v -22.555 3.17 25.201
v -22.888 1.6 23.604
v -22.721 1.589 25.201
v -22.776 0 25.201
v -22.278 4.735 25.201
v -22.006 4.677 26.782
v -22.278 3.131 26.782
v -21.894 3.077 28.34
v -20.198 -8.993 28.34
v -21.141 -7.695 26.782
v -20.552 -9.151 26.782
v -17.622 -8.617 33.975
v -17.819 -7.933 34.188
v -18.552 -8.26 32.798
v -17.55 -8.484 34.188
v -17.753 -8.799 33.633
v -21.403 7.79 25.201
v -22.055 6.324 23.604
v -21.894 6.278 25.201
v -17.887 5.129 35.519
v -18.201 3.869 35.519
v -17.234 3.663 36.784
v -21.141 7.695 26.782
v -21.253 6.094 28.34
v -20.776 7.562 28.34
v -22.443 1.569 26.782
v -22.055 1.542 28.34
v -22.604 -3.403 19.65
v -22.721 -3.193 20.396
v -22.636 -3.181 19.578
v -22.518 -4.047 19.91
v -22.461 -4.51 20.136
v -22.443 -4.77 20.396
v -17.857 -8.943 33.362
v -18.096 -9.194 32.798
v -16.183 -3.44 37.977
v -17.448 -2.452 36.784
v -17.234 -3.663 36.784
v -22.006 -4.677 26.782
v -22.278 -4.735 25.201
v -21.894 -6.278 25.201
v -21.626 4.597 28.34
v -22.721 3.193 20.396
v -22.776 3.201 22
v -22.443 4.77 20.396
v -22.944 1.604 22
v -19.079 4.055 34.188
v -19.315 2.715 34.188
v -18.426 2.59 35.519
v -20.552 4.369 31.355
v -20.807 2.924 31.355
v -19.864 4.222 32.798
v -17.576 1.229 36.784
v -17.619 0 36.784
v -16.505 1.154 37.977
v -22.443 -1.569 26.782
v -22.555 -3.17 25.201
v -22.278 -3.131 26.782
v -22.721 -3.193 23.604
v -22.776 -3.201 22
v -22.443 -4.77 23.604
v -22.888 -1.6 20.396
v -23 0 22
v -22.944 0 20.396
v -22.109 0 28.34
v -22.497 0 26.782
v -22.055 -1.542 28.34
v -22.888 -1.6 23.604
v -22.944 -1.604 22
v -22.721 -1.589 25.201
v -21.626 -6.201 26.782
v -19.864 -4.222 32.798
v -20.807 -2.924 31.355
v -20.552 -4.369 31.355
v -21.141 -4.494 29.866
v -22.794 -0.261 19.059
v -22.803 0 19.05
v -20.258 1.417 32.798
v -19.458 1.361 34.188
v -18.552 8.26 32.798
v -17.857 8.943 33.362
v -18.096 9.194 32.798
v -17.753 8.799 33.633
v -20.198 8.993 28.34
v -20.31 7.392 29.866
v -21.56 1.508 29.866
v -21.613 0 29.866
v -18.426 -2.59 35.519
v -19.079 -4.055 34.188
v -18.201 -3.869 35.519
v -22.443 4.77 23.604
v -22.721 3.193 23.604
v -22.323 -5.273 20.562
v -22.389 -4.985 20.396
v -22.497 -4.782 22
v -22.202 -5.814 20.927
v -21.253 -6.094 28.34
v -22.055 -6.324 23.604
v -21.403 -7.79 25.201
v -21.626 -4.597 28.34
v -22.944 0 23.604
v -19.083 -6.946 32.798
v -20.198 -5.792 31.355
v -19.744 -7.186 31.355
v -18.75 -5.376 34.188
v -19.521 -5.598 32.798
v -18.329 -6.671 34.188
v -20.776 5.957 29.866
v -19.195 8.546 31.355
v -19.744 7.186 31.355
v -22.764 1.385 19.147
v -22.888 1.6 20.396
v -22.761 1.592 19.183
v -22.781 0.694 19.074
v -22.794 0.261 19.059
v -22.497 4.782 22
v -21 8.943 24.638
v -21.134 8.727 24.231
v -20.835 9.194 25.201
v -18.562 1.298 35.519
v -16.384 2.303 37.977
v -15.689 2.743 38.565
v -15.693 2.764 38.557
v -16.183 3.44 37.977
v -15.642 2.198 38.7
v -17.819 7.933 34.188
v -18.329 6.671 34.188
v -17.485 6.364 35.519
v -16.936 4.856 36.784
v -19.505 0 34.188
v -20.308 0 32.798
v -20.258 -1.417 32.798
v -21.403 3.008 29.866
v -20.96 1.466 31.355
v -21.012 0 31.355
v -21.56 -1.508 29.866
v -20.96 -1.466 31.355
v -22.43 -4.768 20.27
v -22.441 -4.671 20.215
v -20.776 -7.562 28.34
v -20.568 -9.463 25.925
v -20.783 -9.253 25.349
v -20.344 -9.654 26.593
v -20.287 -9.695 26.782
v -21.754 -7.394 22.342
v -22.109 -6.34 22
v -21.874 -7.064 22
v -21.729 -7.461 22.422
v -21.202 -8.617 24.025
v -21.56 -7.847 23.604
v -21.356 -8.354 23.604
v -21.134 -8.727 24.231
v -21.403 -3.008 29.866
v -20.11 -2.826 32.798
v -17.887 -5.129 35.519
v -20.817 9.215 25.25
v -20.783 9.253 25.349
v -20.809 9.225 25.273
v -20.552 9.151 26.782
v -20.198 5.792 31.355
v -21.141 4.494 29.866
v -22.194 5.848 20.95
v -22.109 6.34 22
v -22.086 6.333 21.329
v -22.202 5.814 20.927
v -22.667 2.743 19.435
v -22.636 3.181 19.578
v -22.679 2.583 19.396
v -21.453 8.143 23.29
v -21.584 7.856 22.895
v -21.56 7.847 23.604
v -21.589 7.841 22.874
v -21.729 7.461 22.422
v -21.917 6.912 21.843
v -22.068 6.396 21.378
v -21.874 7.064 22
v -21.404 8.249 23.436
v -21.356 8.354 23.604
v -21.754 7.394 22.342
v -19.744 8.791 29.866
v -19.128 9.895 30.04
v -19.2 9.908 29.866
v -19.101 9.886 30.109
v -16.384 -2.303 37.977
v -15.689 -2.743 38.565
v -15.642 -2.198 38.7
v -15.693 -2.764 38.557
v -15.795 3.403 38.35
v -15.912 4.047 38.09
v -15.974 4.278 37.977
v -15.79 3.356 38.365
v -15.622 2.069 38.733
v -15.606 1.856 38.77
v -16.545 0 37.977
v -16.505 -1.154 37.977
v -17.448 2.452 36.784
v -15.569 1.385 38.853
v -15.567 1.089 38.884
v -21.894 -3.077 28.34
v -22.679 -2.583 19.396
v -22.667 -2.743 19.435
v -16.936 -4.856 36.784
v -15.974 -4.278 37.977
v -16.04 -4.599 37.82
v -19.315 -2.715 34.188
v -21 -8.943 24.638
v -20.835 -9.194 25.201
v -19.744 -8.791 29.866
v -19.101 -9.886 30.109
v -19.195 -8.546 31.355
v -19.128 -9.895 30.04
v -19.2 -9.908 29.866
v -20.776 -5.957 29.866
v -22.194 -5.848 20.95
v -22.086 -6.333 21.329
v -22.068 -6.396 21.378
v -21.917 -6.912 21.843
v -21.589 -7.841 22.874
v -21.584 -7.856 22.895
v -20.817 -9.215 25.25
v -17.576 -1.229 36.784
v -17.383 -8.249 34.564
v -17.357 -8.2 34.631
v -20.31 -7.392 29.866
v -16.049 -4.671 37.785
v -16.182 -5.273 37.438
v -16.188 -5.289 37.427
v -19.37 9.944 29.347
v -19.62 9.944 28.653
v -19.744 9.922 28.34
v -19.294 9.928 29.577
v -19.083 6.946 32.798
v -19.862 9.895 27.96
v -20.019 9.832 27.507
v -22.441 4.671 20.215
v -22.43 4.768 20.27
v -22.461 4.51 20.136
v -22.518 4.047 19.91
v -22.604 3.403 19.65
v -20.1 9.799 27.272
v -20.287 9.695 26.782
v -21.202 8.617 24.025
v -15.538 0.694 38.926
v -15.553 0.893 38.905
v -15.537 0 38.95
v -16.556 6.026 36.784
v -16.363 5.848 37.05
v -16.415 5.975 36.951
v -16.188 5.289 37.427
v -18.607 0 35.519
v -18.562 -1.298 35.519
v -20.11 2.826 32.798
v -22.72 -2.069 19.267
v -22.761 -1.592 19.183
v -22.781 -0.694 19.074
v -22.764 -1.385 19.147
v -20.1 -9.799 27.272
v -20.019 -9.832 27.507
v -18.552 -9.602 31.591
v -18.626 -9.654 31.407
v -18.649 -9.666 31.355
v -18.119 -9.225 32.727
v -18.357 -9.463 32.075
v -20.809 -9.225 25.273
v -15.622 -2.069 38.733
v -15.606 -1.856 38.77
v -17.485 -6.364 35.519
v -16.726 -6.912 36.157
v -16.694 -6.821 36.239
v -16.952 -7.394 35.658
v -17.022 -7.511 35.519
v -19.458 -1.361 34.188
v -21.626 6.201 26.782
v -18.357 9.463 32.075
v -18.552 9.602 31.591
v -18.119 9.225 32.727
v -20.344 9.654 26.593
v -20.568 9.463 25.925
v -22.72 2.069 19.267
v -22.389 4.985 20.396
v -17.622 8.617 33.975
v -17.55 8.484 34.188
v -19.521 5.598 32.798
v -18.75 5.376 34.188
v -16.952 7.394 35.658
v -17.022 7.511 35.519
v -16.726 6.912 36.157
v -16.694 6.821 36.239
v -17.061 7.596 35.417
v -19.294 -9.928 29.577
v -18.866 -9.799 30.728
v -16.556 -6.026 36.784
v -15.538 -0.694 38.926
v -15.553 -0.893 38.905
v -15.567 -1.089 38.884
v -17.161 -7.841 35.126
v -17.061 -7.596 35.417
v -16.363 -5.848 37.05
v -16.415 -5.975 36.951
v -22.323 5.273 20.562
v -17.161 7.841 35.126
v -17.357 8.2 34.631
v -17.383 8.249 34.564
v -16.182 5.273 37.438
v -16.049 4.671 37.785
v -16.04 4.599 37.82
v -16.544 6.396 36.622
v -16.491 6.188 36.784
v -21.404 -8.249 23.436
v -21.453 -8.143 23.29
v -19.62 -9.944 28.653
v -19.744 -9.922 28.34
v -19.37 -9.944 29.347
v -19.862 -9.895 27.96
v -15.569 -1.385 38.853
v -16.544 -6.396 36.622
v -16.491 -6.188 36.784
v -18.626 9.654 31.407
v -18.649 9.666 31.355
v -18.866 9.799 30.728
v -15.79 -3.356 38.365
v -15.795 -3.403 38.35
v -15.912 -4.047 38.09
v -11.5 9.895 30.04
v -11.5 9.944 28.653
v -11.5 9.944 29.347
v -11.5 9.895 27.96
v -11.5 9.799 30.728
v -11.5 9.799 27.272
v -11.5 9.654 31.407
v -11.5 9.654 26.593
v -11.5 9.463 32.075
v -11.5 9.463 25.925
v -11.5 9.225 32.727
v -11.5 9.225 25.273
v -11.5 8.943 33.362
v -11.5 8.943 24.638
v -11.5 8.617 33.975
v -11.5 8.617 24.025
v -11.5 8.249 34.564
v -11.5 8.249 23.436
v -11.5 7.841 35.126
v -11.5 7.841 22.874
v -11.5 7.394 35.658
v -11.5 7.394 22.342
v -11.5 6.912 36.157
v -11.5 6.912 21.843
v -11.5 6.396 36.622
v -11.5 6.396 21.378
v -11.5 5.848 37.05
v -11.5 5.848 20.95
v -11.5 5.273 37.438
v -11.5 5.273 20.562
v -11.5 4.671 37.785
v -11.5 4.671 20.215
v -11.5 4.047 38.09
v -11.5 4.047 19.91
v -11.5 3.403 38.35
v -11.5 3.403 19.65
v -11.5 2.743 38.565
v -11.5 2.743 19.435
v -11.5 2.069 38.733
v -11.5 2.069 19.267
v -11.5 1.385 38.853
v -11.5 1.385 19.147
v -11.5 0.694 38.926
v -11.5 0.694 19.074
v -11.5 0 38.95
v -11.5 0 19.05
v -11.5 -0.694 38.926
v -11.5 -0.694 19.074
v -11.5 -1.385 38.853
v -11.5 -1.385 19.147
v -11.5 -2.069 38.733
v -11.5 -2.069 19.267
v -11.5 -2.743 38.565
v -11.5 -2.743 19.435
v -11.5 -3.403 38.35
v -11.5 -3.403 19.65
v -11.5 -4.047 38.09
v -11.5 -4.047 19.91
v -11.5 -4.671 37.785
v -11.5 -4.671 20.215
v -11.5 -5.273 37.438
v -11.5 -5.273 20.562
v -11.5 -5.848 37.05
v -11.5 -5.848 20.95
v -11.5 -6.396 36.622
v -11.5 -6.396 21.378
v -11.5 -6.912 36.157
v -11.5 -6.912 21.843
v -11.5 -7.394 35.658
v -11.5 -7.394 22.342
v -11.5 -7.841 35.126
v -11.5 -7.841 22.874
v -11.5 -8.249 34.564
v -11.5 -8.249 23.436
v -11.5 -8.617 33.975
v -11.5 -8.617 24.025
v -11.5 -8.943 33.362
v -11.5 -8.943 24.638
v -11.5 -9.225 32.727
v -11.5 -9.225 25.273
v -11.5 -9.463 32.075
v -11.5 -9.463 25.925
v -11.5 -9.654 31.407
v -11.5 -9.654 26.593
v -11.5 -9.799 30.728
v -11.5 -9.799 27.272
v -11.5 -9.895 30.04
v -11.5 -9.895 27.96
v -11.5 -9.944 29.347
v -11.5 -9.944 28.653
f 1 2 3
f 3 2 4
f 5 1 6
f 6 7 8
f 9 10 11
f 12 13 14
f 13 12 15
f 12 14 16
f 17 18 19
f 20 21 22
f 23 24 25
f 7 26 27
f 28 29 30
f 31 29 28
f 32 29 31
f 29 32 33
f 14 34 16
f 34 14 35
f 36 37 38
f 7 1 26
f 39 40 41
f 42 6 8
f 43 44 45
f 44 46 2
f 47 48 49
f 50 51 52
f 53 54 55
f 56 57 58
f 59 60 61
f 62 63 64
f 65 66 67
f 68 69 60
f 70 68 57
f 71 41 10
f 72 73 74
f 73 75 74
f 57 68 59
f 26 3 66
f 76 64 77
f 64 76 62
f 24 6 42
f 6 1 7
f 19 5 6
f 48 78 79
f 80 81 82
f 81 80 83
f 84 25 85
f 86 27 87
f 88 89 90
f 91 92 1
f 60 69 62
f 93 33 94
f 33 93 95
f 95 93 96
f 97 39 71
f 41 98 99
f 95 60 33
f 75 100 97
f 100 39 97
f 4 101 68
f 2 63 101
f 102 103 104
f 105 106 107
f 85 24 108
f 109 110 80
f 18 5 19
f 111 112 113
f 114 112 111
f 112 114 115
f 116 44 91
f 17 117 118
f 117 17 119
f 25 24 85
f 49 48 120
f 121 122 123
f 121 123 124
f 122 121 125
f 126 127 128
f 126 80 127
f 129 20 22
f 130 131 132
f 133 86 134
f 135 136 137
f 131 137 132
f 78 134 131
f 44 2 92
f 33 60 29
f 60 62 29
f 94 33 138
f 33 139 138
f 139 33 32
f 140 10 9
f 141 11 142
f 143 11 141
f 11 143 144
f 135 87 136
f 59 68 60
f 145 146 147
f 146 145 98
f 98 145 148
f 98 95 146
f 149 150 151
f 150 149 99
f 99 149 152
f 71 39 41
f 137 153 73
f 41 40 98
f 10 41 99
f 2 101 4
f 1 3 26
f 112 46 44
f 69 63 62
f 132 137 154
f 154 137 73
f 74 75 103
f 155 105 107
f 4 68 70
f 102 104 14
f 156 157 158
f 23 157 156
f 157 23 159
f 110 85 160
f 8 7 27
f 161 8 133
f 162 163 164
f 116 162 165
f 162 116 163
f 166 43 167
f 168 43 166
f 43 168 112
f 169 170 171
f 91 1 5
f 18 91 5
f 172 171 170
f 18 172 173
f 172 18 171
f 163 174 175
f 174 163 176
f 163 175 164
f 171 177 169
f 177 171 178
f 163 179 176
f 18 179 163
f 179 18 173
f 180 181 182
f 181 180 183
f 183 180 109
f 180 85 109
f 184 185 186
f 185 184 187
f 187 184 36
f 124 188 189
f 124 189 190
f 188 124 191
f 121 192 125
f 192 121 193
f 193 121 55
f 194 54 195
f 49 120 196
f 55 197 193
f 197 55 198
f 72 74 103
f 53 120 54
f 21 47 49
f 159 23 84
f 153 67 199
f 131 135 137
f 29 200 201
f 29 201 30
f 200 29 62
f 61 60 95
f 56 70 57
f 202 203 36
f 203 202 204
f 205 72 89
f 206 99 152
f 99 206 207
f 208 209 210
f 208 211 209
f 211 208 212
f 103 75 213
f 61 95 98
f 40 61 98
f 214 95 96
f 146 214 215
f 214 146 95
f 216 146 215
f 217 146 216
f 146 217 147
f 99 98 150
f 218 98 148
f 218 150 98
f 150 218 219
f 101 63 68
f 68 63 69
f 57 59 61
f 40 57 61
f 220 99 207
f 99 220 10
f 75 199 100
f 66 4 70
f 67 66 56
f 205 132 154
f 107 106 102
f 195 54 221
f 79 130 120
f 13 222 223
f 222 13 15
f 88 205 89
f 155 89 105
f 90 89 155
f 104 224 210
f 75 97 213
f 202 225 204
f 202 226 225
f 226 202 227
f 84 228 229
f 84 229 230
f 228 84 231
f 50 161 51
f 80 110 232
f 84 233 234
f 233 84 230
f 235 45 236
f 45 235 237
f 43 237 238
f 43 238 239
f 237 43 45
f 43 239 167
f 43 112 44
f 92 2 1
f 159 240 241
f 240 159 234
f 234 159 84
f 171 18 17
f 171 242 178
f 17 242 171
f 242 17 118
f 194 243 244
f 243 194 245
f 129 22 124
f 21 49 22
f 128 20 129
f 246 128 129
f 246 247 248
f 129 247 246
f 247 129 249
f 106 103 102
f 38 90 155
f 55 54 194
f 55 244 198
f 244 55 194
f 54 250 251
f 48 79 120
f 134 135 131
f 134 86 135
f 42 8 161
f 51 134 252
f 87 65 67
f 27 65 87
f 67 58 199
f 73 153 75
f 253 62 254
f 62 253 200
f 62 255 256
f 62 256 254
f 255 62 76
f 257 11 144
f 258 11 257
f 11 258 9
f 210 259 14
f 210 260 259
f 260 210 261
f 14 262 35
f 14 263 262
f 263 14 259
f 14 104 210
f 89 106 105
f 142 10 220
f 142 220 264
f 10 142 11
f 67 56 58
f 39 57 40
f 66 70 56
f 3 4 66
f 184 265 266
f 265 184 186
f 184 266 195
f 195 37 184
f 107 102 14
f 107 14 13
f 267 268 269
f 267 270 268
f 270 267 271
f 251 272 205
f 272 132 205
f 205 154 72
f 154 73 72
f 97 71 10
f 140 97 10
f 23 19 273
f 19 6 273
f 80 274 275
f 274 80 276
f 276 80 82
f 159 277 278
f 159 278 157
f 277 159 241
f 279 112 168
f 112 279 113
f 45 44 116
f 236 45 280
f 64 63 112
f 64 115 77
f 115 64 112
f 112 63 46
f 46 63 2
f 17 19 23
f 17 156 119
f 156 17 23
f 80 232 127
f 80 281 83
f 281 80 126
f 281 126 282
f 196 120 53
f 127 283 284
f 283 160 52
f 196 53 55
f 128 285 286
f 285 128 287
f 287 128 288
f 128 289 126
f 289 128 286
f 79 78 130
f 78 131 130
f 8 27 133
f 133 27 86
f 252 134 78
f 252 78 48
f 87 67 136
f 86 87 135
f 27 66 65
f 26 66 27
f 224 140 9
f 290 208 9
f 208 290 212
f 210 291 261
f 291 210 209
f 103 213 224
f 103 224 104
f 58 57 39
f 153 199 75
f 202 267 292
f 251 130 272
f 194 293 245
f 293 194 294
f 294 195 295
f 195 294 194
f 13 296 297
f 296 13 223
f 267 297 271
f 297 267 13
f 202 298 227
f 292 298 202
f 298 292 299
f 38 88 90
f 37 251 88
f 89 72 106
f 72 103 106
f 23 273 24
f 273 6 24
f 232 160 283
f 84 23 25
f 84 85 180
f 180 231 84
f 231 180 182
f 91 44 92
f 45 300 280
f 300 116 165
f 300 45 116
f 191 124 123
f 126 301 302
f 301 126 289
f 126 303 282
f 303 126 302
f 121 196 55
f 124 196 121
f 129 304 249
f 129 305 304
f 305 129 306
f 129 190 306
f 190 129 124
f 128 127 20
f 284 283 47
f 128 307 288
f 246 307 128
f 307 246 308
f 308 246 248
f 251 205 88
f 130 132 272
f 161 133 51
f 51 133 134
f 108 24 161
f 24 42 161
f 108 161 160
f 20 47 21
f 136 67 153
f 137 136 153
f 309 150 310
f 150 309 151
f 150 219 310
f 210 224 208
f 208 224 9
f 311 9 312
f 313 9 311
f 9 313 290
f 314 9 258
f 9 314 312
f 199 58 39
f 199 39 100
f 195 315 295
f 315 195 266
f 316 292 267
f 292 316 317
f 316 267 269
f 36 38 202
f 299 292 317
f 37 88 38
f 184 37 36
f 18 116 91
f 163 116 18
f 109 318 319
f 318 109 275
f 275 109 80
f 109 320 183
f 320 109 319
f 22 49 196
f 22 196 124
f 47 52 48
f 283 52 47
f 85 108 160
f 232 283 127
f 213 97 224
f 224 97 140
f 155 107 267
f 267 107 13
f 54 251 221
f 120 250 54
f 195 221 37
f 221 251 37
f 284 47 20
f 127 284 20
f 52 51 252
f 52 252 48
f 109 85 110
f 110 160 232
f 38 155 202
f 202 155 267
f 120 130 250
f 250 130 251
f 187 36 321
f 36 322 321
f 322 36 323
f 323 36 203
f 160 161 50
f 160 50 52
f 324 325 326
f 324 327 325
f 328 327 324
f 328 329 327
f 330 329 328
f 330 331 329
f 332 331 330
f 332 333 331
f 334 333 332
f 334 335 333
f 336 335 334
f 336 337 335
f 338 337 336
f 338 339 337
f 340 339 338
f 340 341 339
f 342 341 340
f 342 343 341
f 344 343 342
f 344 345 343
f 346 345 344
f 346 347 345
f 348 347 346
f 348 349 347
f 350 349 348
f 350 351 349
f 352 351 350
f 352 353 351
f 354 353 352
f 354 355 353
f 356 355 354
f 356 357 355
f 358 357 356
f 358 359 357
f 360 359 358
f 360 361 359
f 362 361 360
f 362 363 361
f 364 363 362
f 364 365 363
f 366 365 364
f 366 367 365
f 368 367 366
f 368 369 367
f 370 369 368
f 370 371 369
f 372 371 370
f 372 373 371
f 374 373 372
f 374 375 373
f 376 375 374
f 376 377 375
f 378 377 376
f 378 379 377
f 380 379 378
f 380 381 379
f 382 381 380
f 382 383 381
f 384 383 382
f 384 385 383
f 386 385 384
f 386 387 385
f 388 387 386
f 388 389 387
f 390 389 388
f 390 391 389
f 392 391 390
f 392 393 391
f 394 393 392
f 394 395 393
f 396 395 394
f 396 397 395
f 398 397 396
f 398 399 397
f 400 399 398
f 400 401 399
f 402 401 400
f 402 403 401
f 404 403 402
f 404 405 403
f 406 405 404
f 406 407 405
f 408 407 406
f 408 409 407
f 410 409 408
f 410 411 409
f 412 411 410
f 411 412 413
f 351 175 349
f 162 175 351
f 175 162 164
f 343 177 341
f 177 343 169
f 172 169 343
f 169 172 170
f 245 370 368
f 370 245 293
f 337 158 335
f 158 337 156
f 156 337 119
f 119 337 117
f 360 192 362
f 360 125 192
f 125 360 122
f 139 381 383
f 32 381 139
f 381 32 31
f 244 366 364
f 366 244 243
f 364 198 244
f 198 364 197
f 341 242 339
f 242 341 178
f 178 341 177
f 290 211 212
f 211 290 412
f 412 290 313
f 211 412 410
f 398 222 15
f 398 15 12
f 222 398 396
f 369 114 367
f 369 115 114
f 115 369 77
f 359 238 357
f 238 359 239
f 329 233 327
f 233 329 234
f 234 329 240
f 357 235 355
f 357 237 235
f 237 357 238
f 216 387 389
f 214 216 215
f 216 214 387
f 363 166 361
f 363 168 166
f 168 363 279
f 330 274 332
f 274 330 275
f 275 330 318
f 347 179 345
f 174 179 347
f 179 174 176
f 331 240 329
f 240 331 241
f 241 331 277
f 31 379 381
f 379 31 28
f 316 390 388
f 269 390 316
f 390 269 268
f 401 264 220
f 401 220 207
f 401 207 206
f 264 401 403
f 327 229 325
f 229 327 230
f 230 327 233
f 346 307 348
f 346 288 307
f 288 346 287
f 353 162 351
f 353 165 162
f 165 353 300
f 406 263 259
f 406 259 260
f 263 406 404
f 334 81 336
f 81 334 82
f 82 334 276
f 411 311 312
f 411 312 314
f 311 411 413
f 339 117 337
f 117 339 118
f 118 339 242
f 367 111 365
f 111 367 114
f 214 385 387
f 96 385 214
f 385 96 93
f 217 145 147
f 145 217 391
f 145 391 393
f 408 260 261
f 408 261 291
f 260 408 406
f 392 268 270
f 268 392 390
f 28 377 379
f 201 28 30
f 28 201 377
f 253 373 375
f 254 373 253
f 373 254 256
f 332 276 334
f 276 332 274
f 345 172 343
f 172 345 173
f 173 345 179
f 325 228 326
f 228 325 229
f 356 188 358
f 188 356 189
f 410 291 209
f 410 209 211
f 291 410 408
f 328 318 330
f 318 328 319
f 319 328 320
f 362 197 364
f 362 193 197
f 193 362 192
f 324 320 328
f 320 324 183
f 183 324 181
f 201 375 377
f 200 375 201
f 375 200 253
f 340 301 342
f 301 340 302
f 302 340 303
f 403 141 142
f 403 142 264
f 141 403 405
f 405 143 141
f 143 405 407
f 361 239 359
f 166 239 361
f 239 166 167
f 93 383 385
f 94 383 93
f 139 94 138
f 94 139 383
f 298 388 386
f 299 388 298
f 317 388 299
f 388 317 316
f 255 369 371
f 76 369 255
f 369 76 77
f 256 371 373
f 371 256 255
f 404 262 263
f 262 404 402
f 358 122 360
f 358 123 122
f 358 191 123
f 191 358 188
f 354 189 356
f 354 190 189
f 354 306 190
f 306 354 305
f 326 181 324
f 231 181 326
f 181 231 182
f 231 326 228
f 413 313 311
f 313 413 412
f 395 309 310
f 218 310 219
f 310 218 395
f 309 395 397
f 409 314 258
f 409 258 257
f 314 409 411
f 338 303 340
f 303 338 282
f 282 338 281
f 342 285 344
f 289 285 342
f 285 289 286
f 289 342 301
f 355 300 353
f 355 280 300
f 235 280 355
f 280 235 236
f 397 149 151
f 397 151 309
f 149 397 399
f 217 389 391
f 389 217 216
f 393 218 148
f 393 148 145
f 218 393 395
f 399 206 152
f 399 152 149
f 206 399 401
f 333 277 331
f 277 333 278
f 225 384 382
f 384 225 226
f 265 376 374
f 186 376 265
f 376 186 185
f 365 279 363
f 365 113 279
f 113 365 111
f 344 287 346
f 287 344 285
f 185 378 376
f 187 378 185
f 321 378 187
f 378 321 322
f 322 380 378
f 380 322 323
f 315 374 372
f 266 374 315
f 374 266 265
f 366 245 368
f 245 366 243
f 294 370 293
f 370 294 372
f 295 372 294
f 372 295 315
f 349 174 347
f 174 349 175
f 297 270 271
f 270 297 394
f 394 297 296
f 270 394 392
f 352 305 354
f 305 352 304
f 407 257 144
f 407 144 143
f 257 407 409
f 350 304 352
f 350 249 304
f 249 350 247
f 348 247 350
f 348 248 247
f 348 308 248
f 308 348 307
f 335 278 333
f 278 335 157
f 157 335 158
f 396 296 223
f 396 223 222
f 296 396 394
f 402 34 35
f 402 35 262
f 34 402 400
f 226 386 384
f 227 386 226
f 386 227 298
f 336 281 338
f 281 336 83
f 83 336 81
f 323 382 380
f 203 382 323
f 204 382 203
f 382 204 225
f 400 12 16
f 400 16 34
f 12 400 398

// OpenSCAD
$fn=90;
intersection()
{
  difference()
  {
    translate([0,0,22])sphere(23);
    translate([-11.5,-25,-1])cube([50,50,50]);
  }
  translate([-40,0,15+12.5+1.5])rotate([0,90,0])
  {
    cylinder(r=9.95,h=50);
  }
}
